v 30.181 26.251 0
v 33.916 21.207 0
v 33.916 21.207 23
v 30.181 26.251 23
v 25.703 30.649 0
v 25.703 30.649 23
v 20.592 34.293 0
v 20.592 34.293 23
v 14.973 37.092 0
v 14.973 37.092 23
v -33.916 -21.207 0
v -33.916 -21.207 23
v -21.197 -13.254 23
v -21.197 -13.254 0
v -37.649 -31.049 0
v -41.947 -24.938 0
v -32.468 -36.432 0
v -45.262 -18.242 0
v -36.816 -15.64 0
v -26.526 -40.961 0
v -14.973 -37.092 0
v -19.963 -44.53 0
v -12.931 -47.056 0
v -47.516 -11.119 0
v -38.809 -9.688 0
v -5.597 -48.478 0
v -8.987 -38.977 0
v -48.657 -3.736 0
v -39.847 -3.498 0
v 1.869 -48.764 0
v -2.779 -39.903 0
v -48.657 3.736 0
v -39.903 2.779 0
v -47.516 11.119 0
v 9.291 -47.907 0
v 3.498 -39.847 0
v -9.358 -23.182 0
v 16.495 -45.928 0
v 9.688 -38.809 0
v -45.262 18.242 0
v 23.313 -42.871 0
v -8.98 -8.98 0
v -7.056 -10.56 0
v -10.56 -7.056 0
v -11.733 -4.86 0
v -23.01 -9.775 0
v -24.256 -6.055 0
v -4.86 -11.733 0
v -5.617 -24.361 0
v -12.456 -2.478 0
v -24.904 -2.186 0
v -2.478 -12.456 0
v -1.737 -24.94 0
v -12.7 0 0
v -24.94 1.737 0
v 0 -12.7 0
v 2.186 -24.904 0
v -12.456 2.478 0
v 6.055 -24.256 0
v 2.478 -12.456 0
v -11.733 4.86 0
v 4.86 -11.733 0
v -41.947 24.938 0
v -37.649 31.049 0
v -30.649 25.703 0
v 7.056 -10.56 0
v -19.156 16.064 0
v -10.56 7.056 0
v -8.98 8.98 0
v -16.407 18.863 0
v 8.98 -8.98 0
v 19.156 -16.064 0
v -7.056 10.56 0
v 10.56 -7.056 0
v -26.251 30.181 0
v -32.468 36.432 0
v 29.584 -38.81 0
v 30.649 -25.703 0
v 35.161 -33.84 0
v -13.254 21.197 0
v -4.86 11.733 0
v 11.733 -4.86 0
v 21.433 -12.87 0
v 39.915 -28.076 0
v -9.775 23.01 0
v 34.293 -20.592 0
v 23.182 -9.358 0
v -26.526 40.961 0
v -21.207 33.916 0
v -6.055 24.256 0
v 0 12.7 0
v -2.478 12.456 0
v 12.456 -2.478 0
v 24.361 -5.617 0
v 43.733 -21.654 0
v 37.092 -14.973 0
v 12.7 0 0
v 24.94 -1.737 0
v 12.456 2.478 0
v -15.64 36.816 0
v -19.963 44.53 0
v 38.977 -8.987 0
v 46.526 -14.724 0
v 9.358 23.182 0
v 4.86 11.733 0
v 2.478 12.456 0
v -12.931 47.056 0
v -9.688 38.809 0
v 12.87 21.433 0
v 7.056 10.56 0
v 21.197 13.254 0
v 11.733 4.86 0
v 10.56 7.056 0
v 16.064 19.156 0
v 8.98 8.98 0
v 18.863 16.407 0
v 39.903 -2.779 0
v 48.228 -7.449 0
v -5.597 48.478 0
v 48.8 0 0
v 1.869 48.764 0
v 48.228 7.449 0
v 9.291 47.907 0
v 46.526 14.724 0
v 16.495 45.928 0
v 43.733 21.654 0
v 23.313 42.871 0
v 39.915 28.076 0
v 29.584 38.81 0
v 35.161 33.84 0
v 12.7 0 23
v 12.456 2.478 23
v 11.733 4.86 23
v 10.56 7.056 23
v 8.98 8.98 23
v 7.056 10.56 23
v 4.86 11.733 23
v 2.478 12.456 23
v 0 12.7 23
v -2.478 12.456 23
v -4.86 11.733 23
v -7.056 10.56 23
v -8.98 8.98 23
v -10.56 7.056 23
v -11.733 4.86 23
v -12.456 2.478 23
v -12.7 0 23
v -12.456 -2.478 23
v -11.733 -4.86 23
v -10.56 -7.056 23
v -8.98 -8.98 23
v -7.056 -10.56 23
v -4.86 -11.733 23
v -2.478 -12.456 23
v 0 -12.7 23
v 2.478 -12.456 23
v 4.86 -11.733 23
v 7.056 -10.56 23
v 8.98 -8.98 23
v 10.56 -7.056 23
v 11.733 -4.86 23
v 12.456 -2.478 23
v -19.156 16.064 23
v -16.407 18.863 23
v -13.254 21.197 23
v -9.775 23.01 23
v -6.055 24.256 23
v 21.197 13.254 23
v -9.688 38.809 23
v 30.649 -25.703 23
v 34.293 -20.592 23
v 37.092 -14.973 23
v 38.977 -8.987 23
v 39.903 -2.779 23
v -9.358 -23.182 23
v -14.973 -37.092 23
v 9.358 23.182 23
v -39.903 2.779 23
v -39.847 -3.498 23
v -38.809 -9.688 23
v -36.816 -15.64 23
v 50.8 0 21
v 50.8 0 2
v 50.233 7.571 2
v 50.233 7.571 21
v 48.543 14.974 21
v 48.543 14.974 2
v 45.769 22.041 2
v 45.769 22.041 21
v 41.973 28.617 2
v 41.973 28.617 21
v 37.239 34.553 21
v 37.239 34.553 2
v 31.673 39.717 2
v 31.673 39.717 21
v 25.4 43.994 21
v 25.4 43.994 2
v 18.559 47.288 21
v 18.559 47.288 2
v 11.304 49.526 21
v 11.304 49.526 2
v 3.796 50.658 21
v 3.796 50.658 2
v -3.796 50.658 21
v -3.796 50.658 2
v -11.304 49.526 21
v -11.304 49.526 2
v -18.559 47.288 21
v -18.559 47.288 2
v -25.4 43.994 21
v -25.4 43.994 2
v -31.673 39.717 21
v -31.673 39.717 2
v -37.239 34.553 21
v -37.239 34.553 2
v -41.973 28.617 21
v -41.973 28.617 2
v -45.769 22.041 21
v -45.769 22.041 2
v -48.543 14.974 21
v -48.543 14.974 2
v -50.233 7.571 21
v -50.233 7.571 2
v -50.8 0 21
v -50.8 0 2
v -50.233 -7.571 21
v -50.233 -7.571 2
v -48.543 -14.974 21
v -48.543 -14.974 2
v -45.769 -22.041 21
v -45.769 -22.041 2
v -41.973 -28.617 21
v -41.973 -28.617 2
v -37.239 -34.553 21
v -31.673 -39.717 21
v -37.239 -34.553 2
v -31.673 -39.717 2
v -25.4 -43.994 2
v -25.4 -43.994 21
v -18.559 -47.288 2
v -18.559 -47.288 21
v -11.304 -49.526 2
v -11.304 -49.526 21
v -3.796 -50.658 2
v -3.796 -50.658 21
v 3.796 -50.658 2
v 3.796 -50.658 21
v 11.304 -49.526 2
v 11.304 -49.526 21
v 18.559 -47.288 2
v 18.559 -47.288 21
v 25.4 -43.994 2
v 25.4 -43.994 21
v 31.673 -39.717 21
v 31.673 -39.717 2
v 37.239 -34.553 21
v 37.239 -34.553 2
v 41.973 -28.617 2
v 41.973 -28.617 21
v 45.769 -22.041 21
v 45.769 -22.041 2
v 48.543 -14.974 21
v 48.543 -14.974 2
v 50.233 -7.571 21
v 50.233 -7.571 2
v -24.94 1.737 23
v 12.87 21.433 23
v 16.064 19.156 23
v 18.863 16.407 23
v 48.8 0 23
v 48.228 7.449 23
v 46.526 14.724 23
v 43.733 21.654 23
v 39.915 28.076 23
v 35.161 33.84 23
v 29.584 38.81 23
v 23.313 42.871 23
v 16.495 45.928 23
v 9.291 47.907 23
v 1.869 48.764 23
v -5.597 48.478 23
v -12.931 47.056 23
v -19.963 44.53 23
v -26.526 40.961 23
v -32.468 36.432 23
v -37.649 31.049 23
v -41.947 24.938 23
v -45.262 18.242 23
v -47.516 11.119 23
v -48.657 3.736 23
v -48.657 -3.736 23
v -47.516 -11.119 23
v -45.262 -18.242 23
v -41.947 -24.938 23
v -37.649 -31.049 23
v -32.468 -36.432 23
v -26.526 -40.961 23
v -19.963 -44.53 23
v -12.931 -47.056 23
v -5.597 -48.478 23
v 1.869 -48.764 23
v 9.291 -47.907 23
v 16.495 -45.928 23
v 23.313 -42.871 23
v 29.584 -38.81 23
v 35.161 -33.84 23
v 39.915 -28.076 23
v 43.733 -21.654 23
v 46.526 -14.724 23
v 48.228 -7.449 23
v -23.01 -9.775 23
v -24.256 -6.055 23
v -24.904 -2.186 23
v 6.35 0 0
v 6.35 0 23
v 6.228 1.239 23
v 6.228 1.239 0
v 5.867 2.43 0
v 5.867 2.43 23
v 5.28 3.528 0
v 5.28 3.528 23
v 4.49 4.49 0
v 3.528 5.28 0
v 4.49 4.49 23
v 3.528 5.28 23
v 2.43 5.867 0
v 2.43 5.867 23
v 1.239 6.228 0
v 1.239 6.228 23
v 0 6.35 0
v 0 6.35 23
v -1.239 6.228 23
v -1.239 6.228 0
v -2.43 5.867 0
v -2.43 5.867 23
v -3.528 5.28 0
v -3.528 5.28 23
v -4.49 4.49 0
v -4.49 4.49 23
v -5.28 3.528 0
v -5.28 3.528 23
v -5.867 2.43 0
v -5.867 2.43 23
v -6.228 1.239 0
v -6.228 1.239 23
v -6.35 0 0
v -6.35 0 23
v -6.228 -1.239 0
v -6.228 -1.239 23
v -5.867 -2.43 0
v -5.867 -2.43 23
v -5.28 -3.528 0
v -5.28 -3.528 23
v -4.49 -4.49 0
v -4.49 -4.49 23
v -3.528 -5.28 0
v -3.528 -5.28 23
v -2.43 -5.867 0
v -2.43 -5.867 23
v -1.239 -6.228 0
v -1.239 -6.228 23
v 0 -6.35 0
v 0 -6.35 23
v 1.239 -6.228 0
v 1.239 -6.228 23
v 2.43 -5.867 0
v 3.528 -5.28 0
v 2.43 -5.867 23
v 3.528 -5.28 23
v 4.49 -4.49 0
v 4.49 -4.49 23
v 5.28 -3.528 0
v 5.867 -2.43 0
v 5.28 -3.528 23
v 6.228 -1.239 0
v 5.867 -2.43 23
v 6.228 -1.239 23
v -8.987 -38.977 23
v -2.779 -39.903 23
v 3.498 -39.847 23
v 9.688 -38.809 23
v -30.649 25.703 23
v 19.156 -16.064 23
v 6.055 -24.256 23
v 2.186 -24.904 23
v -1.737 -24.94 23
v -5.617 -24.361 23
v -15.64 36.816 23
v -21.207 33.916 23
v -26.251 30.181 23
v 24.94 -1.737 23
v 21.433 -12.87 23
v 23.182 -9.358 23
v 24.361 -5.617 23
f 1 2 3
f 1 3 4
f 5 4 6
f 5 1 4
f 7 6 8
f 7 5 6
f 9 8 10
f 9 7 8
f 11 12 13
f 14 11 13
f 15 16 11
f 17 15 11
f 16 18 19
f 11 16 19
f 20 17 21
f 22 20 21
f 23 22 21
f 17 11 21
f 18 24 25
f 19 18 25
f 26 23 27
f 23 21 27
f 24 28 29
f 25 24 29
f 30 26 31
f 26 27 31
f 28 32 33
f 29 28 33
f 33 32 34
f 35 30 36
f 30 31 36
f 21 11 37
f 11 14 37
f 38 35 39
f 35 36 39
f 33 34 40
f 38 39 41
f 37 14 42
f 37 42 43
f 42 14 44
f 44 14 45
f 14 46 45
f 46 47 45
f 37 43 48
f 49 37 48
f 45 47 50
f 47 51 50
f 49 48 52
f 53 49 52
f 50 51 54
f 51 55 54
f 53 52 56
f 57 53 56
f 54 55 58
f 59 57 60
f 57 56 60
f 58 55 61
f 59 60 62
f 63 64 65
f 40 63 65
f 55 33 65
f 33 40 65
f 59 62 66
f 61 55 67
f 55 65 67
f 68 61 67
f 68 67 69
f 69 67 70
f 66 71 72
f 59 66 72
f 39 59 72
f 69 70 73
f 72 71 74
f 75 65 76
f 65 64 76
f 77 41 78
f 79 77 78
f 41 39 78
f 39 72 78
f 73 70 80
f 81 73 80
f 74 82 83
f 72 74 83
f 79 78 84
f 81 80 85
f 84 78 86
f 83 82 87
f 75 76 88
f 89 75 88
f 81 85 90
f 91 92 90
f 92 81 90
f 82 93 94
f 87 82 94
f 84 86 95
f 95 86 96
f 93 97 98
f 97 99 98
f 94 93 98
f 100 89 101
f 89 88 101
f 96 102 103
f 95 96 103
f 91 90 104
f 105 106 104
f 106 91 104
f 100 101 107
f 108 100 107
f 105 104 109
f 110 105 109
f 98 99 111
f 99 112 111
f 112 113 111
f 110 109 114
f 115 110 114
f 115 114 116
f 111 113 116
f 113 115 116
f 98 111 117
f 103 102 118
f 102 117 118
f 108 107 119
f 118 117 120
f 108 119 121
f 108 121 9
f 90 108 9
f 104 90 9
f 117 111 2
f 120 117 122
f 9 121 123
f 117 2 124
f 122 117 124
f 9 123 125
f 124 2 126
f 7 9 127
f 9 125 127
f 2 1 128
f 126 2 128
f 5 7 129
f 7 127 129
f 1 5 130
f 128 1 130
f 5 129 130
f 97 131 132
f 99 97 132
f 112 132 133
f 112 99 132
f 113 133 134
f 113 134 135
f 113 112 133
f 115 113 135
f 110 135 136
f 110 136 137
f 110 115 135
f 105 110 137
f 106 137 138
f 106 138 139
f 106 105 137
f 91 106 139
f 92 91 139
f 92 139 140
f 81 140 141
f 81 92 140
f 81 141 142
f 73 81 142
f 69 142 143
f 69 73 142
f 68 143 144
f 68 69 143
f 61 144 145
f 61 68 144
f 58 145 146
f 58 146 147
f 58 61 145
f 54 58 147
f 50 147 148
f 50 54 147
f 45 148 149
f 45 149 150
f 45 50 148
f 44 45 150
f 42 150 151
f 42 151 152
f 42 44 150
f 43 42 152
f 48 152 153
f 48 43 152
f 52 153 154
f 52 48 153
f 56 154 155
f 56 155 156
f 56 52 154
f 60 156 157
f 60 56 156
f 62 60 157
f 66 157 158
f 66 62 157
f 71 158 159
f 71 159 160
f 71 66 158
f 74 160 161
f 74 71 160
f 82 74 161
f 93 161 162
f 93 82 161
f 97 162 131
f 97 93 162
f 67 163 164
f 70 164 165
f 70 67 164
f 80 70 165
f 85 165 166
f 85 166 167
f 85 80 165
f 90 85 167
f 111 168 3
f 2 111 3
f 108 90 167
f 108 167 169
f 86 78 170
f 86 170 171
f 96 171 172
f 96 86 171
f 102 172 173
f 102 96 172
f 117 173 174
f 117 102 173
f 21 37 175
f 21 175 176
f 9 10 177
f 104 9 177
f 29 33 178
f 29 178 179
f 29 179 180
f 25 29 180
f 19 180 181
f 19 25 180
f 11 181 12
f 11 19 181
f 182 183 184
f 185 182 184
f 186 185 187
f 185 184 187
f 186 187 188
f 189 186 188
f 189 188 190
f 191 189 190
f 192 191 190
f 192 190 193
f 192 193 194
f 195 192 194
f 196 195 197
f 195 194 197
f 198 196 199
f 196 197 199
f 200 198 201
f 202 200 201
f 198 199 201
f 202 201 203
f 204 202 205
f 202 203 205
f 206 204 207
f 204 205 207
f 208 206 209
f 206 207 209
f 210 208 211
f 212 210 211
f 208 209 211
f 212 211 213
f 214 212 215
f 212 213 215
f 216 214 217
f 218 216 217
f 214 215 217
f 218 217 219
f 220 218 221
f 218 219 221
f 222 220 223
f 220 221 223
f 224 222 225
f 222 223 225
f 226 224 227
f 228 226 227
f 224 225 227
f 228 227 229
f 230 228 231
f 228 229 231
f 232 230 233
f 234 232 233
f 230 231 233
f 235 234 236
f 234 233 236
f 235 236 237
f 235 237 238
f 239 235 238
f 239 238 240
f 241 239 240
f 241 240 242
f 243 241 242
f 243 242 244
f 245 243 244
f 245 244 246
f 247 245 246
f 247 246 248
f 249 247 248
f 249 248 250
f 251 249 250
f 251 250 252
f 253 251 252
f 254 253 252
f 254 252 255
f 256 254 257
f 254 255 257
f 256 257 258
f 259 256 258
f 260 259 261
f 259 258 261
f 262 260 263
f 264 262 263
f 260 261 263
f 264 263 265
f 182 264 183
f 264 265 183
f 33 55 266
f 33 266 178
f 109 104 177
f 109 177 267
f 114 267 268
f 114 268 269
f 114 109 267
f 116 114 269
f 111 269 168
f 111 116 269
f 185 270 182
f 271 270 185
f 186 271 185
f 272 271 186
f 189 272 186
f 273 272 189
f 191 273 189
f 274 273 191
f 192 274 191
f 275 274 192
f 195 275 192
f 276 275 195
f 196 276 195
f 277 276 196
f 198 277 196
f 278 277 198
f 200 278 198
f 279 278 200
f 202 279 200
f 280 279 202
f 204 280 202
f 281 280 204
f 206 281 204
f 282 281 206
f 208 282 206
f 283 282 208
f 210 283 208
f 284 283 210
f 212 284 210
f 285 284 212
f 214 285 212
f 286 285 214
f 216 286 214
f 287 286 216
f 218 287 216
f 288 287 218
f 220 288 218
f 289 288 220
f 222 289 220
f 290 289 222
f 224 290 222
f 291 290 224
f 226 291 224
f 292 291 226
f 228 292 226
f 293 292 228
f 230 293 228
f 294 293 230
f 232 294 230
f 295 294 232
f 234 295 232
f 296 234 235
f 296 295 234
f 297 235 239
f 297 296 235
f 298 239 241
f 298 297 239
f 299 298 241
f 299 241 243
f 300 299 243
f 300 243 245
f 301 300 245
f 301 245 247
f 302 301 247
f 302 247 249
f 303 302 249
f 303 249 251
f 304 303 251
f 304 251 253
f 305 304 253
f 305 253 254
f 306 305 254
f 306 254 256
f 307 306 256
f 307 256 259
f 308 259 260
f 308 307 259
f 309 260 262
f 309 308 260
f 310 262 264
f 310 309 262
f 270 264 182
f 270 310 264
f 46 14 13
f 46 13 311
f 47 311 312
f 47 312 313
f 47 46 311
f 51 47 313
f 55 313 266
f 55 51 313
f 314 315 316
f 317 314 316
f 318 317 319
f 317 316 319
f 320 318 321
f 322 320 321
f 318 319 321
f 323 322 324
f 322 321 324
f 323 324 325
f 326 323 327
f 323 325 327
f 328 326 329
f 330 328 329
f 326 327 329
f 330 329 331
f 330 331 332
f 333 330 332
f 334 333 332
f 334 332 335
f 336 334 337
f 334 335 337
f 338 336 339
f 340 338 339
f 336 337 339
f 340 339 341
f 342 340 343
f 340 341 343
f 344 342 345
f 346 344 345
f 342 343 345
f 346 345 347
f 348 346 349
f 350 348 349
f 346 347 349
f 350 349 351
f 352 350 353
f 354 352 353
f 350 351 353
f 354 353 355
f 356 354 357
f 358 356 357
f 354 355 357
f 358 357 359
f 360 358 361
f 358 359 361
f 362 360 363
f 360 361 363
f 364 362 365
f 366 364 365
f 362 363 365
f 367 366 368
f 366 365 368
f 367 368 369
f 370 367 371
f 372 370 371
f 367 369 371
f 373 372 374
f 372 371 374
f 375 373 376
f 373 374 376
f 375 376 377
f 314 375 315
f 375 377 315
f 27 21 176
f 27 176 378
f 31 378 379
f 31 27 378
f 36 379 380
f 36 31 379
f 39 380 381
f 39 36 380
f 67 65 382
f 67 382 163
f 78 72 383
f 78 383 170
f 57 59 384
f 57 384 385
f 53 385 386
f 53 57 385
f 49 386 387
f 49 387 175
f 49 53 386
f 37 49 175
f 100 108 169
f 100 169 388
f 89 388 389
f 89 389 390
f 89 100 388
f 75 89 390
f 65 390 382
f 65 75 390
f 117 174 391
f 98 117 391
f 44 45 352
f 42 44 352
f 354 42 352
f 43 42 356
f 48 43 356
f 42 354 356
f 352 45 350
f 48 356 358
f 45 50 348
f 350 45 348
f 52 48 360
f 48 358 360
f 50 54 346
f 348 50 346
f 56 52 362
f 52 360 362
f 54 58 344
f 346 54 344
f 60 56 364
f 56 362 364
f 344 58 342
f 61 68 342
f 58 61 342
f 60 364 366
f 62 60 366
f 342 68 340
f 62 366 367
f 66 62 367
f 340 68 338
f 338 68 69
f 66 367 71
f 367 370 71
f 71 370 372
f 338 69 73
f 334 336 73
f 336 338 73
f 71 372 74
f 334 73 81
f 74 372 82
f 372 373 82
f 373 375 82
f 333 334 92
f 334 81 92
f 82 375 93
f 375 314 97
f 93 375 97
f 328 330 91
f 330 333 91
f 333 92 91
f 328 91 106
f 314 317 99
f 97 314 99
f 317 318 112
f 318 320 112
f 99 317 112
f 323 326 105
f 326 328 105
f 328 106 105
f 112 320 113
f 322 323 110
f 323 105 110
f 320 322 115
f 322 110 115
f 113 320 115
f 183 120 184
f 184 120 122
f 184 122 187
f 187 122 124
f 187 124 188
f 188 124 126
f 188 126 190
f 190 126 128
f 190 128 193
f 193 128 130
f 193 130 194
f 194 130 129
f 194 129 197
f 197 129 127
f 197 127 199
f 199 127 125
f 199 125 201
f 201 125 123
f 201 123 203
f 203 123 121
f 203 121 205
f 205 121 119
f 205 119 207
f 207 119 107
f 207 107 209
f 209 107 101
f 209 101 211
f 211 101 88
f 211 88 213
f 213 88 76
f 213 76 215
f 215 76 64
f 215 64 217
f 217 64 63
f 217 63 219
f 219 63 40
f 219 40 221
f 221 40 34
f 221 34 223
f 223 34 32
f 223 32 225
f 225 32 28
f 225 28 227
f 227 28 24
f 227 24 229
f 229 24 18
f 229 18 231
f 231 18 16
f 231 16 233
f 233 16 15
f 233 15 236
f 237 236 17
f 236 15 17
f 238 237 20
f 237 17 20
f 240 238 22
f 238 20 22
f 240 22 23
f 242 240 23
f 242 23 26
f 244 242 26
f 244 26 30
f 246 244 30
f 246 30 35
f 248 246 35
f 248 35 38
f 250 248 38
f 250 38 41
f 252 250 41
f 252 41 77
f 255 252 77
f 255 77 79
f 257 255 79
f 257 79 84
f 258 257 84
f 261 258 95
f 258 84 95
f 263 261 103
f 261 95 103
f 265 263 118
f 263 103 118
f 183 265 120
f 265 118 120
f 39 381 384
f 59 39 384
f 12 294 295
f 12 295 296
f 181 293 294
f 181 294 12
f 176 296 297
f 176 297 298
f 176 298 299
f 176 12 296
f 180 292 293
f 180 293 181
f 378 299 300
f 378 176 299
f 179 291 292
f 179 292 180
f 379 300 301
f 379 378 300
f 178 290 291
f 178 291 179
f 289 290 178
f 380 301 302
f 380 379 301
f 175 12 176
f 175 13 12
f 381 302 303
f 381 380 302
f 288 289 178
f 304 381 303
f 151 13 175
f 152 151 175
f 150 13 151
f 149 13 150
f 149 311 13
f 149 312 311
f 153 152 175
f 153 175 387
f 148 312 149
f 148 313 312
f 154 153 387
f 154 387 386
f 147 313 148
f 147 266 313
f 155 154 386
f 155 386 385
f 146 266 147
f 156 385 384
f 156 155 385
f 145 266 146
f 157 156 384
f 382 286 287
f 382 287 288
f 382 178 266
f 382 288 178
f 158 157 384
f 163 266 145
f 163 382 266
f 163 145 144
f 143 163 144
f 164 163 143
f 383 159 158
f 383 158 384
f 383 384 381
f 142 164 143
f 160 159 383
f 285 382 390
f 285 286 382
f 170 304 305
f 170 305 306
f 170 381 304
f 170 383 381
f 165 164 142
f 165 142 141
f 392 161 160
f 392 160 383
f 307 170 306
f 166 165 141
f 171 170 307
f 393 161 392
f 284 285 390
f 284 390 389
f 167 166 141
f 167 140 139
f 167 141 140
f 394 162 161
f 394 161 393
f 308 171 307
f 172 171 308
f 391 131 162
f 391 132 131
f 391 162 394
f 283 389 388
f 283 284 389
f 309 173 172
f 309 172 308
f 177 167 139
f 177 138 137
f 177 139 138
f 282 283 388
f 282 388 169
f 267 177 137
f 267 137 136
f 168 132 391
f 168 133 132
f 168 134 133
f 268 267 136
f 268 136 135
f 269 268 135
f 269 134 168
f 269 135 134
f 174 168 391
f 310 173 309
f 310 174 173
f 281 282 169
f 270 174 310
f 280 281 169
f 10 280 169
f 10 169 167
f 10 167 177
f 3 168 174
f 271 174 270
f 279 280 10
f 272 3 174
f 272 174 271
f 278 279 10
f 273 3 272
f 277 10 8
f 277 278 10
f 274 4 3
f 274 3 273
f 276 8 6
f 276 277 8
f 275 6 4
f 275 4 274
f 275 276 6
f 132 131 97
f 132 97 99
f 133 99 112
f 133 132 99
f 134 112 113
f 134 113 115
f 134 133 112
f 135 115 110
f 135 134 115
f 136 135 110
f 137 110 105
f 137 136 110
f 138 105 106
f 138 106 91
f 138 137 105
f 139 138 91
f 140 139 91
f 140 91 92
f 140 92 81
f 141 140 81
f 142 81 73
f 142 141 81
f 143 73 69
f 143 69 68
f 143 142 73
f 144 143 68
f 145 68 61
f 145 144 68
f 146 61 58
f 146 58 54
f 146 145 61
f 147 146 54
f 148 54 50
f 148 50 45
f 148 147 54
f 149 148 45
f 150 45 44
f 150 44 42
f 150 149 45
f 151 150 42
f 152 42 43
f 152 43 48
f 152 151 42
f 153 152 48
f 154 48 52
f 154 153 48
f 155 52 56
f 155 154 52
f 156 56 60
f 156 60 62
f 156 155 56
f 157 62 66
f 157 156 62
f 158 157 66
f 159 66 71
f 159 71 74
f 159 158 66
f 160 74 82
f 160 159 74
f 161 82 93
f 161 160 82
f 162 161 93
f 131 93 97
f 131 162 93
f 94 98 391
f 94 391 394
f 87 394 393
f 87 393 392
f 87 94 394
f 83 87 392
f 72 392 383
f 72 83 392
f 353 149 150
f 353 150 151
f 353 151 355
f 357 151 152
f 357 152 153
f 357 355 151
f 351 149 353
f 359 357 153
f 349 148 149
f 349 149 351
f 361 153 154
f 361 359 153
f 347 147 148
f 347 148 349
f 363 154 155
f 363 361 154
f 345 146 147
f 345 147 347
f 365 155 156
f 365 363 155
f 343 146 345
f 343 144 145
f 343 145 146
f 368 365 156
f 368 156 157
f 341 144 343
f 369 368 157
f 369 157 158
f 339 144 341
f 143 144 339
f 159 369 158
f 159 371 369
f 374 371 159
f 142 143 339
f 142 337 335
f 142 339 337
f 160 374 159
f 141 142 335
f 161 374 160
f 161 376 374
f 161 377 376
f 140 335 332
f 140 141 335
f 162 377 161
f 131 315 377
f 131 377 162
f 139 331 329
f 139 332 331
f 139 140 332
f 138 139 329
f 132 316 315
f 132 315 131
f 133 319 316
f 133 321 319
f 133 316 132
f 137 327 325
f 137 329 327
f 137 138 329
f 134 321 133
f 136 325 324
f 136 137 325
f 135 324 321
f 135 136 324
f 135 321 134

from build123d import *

# Parameters (mm, degrees)
SKETCH1_R           = 50.8
SKETCH1_R_2         = 12.7
BOSS_EXTRUDE1_DEPTH = 23
CHAMFER1_SIZE       = 2
SKETCH3_R           = 12.7
SKETCH3_R_2         = 6.35
BOSS_EXTRUDE3_DEPTH = 23


with BuildPart() as part:
    # Sketch1 → Boss-Extrude1 (new body)
    with BuildSketch(Plane.XY):
        Circle(SKETCH1_R)
        Circle(SKETCH1_R_2, mode=Mode.SUBTRACT)
        with BuildLine():
            ThreePointArc((-14.973462877, -37.091716184), (-2.77863879, -39.903372871), (9.688177823, -38.809009398))
            Line((9.688177823, -38.809009398), (6.055111139, -24.255630874))
            ThreePointArc((6.055111139, -24.255630874), (-1.736649244, -24.939608044), (-9.358414298, -23.182322615))
            Line((-9.358414298, -23.182322615), (-14.973462877, -37.091716184))
        make_face(mode=Mode.SUBTRACT)
        with BuildLine():
            ThreePointArc((30.649263883, -25.702580092), (37.091716184, -14.973462877), (39.903372871, -2.77863879))
            Line((39.903372871, -2.77863879), (24.939608044, -1.736649244))
            ThreePointArc((24.939608044, -1.736649244), (23.182322615, -9.358414298), (19.155789927, -16.064112558))
            Line((19.155789927, -16.064112558), (30.649263883, -25.702580092))
        make_face(mode=Mode.SUBTRACT)
        with BuildLine():
            ThreePointArc((33.915749687, 21.206648088), (25.702580092, 30.649263883), (14.973462877, 37.091716184))
            Line((14.973462877, 37.091716184), (9.358414298, 23.182322615))
            ThreePointArc((9.358414298, 23.182322615), (16.064112558, 19.155789927), (21.197343555, 13.254155055))
            Line((21.197343555, 13.254155055), (33.915749687, 21.206648088))
        make_face(mode=Mode.SUBTRACT)
        with BuildLine():
            ThreePointArc((-9.688177823, 38.809009398), (-21.206648088, 33.915749687), (-30.649263883, 25.702580092))
            Line((-30.649263883, 25.702580092), (-19.155789927, 16.064112558))
            ThreePointArc((-19.155789927, 16.064112558), (-13.254155055, 21.197343555), (-6.055111139, 24.255630874))
            Line((-6.055111139, 24.255630874), (-9.688177823, 38.809009398))
        make_face(mode=Mode.SUBTRACT)
        with BuildLine():
            ThreePointArc((-39.903372871, 2.77863879), (-38.809009398, -9.688177823), (-33.915749687, -21.206648088))
            Line((-33.915749687, -21.206648088), (-21.197343555, -13.254155055))
            ThreePointArc((-21.197343555, -13.254155055), (-24.255630874, -6.055111139), (-24.939608044, 1.736649244))
            Line((-24.939608044, 1.736649244), (-39.903372871, 2.77863879))
        make_face(mode=Mode.SUBTRACT)
    extrude(amount=BOSS_EXTRUDE1_DEPTH)

    # Chamfer1
    chamfer1_edges = [part.edges().sort_by_distance(p)[0] for p in [
        (-50.8, 0, 23),
        (-50.8, 0, 0),
    ]]
    chamfer(chamfer1_edges, length=CHAMFER1_SIZE)


with BuildPart() as body_2:
    # Sketch3 → Boss-Extrude3 (new body)
    with BuildSketch(Plane.XY.offset(23)):
        Circle(SKETCH3_R)
        Circle(SKETCH3_R_2, mode=Mode.SUBTRACT)
    extrude(amount=-BOSS_EXTRUDE3_DEPTH)


solid = Compound([part.part, body_2.part])
